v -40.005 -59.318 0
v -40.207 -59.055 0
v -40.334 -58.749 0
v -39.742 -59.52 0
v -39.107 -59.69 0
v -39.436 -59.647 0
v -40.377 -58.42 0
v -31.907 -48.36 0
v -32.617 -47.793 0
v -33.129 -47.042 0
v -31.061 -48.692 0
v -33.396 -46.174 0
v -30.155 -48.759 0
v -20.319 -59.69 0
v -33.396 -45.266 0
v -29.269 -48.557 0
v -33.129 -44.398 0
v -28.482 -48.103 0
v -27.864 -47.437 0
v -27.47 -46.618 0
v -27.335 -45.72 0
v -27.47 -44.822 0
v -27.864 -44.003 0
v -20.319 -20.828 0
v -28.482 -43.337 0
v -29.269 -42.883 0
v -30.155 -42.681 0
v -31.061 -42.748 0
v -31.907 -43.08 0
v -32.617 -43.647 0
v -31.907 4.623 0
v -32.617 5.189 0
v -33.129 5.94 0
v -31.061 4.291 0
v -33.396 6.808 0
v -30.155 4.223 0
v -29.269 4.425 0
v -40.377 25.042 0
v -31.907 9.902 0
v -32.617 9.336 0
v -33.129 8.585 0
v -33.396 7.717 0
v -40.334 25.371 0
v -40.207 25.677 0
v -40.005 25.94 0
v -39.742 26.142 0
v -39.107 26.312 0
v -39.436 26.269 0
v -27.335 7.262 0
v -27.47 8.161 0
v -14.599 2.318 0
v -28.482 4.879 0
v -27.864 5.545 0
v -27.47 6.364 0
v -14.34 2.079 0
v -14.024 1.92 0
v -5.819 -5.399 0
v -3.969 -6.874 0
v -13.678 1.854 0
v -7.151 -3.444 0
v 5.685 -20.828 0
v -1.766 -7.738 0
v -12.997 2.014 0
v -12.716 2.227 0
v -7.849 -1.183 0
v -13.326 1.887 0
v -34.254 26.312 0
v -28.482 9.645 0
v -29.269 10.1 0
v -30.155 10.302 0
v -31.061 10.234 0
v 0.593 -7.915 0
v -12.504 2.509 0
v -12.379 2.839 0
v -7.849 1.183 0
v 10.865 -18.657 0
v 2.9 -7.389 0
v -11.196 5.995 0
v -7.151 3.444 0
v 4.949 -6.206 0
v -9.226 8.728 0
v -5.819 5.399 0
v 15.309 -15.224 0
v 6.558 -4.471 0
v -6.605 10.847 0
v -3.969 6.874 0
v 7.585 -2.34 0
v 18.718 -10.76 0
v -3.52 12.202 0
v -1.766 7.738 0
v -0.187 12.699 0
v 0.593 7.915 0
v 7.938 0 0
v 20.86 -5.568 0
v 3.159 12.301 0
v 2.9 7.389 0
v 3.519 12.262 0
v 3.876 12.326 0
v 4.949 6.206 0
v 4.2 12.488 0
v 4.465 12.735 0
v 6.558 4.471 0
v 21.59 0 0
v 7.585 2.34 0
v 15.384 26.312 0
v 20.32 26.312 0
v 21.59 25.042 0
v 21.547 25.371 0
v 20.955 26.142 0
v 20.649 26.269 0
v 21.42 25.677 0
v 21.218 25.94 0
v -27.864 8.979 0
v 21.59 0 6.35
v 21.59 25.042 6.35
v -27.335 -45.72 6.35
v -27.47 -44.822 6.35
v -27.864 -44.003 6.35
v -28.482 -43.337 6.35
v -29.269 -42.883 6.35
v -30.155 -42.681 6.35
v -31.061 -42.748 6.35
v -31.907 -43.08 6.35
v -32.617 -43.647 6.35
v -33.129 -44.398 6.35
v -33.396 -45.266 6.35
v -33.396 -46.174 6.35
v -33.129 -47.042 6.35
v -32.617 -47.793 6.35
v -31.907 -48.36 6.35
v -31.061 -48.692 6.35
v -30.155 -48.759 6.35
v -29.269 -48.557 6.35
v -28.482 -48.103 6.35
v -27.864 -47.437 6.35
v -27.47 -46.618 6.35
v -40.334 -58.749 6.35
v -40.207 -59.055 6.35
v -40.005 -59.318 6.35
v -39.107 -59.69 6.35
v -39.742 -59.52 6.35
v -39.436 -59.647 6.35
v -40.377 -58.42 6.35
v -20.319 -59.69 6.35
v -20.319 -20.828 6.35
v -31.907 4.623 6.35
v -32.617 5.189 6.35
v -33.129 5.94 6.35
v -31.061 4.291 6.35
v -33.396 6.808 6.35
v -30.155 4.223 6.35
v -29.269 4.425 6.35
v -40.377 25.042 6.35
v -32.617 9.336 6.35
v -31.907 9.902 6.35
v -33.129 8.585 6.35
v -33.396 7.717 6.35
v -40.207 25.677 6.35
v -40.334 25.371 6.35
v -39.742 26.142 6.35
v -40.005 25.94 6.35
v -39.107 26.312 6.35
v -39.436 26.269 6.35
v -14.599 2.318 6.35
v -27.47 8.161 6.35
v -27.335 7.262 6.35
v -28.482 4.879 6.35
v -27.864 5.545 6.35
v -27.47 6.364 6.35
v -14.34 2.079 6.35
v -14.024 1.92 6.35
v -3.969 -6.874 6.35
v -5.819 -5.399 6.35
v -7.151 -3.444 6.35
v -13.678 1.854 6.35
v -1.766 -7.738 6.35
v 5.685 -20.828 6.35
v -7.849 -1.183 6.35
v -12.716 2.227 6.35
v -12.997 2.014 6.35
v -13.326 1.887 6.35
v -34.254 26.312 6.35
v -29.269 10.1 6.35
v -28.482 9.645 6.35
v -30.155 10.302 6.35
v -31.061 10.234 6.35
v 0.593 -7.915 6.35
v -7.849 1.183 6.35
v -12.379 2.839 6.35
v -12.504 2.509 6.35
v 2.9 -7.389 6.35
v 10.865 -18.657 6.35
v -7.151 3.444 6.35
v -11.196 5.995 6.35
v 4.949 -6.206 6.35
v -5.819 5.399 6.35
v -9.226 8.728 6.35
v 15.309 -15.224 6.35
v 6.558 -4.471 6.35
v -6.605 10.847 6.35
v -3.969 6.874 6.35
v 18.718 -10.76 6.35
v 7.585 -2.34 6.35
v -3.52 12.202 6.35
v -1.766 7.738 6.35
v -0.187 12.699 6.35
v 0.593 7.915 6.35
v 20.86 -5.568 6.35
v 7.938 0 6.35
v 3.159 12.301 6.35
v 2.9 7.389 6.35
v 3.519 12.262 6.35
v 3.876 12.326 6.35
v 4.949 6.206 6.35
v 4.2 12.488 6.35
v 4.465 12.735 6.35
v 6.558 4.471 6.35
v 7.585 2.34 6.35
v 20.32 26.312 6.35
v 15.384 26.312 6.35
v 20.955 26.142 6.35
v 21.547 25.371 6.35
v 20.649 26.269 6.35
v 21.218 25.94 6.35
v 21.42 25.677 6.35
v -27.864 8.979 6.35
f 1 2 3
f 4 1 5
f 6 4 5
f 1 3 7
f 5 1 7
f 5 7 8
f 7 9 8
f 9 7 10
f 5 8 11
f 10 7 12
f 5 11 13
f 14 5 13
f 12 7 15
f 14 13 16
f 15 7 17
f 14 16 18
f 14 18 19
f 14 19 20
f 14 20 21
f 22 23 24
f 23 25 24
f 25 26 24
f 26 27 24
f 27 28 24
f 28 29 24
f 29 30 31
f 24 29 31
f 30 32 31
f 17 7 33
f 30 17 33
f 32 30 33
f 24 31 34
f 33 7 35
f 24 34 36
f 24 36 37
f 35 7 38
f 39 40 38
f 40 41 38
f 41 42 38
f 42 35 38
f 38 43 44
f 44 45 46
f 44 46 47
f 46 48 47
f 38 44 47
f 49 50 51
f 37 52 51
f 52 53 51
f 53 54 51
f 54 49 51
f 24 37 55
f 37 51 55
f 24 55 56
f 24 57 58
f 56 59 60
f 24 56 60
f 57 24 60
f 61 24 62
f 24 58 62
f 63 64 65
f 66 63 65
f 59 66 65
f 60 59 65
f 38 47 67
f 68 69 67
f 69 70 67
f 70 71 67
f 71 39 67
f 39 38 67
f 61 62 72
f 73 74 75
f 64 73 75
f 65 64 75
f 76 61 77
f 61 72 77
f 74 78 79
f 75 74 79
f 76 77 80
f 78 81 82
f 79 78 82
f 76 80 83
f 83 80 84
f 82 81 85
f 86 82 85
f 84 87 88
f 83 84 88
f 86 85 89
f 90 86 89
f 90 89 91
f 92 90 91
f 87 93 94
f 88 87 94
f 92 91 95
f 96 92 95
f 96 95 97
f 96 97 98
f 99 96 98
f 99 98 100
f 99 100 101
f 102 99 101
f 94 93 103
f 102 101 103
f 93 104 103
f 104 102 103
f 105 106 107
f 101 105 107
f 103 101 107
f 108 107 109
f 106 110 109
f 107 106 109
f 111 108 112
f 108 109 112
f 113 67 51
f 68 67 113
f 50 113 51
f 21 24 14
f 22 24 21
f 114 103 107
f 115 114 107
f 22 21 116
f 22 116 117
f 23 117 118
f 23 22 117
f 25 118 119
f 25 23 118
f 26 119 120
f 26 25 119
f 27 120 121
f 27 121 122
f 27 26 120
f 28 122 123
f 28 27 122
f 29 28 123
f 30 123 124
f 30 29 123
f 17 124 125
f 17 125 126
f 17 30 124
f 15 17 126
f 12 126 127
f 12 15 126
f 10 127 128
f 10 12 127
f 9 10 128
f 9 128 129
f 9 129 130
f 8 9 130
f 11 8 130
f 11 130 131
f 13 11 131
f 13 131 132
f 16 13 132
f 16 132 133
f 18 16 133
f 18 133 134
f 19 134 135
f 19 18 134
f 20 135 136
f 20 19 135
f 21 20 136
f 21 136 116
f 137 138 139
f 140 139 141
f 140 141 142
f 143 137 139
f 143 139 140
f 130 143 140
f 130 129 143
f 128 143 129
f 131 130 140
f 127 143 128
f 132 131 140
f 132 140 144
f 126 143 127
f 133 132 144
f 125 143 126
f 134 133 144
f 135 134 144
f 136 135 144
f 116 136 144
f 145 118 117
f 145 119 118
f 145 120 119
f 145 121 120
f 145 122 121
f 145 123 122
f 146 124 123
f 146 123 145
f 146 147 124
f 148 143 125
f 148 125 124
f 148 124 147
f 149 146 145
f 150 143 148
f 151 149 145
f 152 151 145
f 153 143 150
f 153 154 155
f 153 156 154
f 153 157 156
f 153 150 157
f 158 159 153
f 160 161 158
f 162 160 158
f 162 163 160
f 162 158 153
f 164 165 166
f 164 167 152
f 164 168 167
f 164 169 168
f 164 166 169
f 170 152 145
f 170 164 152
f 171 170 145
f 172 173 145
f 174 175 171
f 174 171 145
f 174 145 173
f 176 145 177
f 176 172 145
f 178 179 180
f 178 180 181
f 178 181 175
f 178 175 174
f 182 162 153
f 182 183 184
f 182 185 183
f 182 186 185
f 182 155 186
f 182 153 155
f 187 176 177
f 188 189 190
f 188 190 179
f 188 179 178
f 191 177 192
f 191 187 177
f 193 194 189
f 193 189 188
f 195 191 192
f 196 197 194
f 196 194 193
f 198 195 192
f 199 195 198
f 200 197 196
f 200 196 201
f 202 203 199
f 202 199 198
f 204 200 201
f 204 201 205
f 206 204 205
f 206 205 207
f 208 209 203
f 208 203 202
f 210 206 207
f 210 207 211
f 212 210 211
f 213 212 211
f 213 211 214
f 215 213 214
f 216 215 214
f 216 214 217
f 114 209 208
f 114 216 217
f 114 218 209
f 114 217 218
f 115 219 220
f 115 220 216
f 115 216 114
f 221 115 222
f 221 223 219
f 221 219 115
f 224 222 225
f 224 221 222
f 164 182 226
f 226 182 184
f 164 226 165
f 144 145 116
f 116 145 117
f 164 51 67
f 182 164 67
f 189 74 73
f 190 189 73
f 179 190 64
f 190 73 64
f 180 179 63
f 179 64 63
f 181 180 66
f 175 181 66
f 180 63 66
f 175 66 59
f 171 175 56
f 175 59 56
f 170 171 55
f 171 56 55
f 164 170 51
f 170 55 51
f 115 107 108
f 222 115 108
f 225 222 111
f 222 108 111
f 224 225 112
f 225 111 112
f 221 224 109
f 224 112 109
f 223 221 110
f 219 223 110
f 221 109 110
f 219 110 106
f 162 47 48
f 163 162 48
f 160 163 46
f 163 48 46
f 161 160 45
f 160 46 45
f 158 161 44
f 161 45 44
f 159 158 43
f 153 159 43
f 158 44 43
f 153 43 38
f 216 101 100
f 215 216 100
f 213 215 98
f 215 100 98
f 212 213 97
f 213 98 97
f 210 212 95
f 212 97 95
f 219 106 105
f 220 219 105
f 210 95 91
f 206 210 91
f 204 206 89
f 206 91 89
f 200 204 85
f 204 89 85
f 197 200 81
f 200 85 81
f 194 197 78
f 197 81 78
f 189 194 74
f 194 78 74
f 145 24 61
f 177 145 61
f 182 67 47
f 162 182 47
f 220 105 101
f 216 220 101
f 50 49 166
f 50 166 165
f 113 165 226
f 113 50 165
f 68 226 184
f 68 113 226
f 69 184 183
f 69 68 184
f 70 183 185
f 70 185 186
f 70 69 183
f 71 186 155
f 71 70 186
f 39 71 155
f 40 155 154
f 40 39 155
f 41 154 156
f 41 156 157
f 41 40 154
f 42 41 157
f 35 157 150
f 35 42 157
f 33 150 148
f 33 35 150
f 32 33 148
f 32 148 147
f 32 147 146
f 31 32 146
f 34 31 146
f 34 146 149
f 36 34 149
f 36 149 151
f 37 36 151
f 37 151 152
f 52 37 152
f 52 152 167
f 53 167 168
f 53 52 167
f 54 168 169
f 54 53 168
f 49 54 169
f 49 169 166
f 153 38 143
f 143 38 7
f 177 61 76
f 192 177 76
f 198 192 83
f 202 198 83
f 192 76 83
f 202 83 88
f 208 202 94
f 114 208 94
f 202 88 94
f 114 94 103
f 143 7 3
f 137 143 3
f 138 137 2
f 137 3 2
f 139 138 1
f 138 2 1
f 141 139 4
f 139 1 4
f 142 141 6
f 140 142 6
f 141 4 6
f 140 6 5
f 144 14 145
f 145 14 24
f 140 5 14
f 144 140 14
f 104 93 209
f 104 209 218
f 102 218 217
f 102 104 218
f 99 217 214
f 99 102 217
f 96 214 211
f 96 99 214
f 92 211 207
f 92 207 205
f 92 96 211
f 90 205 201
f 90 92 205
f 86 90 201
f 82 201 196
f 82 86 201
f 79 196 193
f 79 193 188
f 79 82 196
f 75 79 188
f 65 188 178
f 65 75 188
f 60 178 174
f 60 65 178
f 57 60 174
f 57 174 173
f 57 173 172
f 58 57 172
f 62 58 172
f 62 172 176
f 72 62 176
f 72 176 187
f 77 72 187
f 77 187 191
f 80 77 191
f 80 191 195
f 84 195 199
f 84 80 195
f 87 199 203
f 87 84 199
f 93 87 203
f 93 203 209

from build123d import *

# Parameters (mm, degrees)
SKETCH1_R           = 3.048
SKETCH1_R_2         = 7.9375
BOSS_EXTRUDE1_DEPTH = 6.35


with BuildPart() as part:
    # Sketch1 → Boss-Extrude1 (new body)
    with BuildSketch(Plane.XY):
        with BuildLine():
            Line((21.59, 0), (21.59, 25.042396902))
            ThreePointArc((21.59, 25.042396902), (21.218025612, 25.940422514), (20.32, 26.312396902))
            Line((20.32, 26.312396902), (15.384027181, 26.312396902))
            Line((15.384027181, 26.312396902), (4.464894623, 12.734941429))
            ThreePointArc((4.464894623, 12.734941429), (3.875986132, 12.325731507), (3.159297438, 12.300765818))
            ThreePointArc((3.159297438, 12.300765818), (-6.605300924, 10.84711942), (-12.378605801, 2.839034768))
            ThreePointArc((-12.378605801, 2.839034768), (-13.326403154, 1.886506555), (-14.59892418, 2.318154625))
            Line((-14.59892418, 2.318154625), (-34.253888671, 26.312396902))
            Line((-34.253888671, 26.312396902), (-39.107436935, 26.312396902))
            ThreePointArc((-39.107436935, 26.312396902), (-40.005462547, 25.940422514), (-40.377436935, 25.042396902))
            Line((-40.377436935, 25.042396902), (-40.377436935, -58.42))
            ThreePointArc((-40.377436935, -58.42), (-40.005462547, -59.318025612), (-39.107436935, -59.69))
            Line((-39.107436935, -59.69), (-20.319056935, -59.69))
            Line((-20.319056935, -59.69), (-20.319056935, -20.828))
            Line((-20.319056935, -20.828), (5.685289439, -20.828))
            ThreePointArc((5.685289439, -20.828), (17.159159347, -13.103104613), (21.59, 0))
        make_face()
        with Locations((-30.382536935, 7.262396902)):
            Circle(SKETCH1_R, mode=Mode.SUBTRACT)
        Circle(SKETCH1_R_2, mode=Mode.SUBTRACT)
        with Locations((-30.382536935, -45.72)):
            Circle(SKETCH1_R, mode=Mode.SUBTRACT)
    extrude(amount=BOSS_EXTRUDE1_DEPTH)


solid = part.part
